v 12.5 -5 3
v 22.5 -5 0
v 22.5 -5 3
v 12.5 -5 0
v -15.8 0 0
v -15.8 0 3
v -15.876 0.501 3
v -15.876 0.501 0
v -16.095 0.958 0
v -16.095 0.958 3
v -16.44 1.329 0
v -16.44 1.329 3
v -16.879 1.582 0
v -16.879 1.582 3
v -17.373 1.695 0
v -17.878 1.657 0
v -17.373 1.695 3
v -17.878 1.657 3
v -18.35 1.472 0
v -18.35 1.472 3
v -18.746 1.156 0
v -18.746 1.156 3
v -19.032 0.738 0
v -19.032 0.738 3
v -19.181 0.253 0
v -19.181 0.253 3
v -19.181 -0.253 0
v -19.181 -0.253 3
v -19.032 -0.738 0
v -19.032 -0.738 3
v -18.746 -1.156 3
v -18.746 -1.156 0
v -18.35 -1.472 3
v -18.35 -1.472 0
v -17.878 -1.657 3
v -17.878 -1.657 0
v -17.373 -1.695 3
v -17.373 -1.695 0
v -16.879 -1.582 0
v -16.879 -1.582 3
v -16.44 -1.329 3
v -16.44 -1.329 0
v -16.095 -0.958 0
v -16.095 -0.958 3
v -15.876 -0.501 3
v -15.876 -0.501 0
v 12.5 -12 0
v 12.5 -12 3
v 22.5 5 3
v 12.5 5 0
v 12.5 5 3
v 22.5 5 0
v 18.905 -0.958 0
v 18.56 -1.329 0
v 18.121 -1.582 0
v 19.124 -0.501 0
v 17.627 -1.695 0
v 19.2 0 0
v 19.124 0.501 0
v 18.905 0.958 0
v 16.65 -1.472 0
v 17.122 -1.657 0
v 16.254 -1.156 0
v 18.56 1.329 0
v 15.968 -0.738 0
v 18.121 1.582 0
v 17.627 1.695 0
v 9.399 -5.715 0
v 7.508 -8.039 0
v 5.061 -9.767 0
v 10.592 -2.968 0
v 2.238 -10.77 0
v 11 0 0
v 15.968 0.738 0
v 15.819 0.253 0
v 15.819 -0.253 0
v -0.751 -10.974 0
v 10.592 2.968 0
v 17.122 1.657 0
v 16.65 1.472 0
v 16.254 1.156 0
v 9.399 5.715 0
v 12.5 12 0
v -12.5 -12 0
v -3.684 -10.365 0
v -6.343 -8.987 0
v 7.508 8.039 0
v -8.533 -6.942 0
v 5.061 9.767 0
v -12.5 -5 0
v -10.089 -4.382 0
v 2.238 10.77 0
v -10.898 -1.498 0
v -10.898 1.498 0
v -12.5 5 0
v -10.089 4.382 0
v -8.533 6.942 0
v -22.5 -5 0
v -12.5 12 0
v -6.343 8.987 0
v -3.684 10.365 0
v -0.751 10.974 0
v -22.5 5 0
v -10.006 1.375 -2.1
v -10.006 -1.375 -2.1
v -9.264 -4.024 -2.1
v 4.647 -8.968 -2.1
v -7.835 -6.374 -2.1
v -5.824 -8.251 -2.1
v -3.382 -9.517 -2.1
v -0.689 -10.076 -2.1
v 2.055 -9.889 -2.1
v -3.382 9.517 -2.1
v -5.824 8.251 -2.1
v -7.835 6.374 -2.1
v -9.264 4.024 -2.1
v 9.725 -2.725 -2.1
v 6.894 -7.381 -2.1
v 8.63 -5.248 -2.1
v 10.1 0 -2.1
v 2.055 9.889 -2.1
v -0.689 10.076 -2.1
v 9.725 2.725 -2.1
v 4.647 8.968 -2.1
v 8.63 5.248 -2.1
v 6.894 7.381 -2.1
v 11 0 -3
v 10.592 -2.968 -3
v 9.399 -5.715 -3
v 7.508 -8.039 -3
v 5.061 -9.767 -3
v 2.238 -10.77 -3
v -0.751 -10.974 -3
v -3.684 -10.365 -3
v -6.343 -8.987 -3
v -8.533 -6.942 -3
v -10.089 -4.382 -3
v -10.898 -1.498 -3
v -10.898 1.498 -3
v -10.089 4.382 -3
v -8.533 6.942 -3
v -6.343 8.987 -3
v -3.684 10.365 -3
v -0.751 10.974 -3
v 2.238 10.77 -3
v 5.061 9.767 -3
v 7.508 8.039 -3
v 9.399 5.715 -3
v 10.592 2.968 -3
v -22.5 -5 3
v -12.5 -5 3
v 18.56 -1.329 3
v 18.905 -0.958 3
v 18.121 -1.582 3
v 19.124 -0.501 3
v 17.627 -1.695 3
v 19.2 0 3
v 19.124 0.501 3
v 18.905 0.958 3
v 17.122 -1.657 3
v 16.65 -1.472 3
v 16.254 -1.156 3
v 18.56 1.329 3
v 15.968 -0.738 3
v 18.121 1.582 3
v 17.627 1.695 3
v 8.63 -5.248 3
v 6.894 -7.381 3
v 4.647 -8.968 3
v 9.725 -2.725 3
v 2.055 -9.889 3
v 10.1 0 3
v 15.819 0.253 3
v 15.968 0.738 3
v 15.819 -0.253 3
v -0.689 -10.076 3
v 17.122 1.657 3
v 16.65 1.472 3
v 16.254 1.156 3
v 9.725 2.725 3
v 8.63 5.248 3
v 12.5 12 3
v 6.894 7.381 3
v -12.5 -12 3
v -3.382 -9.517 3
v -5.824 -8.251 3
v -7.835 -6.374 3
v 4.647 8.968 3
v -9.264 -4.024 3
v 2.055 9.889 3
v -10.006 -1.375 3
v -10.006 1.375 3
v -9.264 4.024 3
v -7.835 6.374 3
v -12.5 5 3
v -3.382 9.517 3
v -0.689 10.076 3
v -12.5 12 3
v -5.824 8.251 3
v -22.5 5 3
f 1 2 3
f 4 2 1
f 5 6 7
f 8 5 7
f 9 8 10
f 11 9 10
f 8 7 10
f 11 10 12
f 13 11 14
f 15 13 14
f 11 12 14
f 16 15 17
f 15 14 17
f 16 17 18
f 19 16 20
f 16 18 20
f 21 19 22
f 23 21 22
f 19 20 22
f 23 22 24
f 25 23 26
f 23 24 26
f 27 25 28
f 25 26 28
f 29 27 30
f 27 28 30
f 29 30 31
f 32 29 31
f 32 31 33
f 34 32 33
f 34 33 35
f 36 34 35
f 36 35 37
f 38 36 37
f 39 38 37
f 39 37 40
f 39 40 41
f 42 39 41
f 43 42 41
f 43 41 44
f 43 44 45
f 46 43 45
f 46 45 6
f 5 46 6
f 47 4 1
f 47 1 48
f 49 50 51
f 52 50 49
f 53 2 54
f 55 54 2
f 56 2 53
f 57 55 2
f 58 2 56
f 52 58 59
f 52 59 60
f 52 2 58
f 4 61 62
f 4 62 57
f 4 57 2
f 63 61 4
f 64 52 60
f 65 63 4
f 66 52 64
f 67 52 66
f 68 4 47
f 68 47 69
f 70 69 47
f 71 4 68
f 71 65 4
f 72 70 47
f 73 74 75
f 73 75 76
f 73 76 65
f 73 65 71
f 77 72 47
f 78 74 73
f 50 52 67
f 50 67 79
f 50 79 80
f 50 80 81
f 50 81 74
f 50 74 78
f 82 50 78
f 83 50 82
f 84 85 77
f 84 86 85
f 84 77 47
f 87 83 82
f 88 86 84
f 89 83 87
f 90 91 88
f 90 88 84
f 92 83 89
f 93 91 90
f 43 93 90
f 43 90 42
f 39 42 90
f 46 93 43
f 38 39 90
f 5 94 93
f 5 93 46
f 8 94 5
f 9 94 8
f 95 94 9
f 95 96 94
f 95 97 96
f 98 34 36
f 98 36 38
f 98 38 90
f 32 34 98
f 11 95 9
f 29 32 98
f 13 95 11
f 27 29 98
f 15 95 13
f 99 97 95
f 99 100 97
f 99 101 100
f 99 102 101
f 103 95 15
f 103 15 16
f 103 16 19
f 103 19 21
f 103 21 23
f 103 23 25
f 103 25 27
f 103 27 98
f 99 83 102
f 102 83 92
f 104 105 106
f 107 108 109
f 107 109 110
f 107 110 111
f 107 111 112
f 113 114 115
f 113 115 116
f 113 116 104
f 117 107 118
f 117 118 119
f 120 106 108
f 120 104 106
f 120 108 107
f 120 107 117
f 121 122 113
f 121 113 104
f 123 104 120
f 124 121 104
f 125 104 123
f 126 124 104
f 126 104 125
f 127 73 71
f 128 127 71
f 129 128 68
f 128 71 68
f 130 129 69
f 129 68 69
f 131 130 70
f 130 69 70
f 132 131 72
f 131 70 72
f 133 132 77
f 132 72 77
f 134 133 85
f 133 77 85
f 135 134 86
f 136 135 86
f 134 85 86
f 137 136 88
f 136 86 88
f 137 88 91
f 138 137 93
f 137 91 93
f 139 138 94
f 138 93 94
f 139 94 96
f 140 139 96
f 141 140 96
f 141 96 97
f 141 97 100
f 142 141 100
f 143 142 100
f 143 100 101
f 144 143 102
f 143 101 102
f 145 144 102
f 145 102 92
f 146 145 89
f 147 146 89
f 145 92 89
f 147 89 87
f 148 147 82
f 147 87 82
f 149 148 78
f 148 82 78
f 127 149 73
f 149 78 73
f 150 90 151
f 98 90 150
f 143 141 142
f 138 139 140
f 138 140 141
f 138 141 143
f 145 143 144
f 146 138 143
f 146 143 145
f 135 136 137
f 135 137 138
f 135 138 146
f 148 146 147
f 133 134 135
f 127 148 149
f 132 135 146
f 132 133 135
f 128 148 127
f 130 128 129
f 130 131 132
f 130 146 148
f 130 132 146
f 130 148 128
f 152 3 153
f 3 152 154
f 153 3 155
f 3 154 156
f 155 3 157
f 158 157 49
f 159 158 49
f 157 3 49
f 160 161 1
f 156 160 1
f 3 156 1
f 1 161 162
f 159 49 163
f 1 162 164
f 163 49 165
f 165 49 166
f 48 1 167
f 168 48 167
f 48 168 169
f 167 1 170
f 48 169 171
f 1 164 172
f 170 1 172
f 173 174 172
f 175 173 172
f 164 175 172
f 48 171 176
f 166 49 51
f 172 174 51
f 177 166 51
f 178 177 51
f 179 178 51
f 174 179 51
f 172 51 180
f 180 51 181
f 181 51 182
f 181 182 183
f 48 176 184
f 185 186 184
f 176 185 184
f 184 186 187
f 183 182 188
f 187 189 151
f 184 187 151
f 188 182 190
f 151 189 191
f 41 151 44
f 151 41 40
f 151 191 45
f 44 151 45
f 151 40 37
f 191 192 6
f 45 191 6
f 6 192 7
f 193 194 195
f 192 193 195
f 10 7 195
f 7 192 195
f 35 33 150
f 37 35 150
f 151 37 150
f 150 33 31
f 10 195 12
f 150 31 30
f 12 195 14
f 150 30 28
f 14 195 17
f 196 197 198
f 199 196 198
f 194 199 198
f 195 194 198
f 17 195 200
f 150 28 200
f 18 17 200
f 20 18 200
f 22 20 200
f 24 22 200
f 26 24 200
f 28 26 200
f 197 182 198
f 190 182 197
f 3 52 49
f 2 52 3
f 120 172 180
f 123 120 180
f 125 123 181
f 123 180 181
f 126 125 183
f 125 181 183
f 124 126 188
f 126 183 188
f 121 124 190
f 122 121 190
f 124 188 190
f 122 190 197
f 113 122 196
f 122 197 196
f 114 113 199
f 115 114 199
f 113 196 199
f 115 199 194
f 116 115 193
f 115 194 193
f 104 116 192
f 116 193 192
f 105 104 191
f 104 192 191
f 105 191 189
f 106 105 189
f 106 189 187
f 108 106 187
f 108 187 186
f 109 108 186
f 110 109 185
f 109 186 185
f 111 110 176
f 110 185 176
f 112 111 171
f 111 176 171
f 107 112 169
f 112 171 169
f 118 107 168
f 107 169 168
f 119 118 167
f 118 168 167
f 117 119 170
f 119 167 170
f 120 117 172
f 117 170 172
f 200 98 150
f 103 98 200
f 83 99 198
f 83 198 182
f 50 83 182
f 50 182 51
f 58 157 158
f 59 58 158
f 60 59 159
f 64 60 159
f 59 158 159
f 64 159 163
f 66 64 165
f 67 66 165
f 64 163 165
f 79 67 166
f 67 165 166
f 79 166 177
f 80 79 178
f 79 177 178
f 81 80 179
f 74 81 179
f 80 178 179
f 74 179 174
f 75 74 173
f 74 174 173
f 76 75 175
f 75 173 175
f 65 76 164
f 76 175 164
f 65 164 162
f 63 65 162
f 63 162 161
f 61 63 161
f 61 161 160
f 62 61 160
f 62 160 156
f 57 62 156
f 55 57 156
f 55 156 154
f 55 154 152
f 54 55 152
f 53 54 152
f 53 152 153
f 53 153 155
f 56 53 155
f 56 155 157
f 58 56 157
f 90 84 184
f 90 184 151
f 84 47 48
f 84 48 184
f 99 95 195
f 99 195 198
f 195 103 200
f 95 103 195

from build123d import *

# Parameters (mm, degrees)
PAD_DEPTH       = 3
SKETCH001_R     = 11
PAD001_DEPTH    = 3
SKETCH002_R     = 10.1
POCKET_DEPTH    = 5.1
SKETCH003_R     = 1.7
POCKET001_DEPTH = 5


with BuildPart() as part:
    # Sketch → Pad (new body)
    with BuildSketch(Plane.XY):
        Polygon((-12.5, -5), (-22.5, -5), (-22.5, 5), (-12.5, 5), (-12.5, 12), (12.5, 12), (12.5, 5), (22.5, 5), (22.5, -5), (12.5, -5), (12.5, -12), (-12.5, -12), align=None)
    extrude(amount=PAD_DEPTH)

    # Sketch001 (on Face13 of Pad) → Pad001 (join)
    with BuildSketch(Plane(origin=(0, 0, 0), x_dir=(1, 0, 0), z_dir=(0, 0, -1))):
        Circle(SKETCH001_R)
    extrude(amount=PAD001_DEPTH)

    # Sketch002 (on Face5 of Pad001) → Pocket (cut)
    with BuildSketch(Plane.XY.offset(3)):
        Circle(SKETCH002_R)
    extrude(amount=-POCKET_DEPTH, mode=Mode.SUBTRACT)

    # Sketch003 (on Face5 of Pocket) → Pocket001 (cut)
    with BuildSketch(Plane.XY.offset(3)):
        with Locations((-17.5, 0)):
            Circle(SKETCH003_R)
        with Locations((17.5, 0)):
            Circle(SKETCH003_R)
    extrude(amount=-POCKET001_DEPTH, mode=Mode.SUBTRACT)


solid = part.part
